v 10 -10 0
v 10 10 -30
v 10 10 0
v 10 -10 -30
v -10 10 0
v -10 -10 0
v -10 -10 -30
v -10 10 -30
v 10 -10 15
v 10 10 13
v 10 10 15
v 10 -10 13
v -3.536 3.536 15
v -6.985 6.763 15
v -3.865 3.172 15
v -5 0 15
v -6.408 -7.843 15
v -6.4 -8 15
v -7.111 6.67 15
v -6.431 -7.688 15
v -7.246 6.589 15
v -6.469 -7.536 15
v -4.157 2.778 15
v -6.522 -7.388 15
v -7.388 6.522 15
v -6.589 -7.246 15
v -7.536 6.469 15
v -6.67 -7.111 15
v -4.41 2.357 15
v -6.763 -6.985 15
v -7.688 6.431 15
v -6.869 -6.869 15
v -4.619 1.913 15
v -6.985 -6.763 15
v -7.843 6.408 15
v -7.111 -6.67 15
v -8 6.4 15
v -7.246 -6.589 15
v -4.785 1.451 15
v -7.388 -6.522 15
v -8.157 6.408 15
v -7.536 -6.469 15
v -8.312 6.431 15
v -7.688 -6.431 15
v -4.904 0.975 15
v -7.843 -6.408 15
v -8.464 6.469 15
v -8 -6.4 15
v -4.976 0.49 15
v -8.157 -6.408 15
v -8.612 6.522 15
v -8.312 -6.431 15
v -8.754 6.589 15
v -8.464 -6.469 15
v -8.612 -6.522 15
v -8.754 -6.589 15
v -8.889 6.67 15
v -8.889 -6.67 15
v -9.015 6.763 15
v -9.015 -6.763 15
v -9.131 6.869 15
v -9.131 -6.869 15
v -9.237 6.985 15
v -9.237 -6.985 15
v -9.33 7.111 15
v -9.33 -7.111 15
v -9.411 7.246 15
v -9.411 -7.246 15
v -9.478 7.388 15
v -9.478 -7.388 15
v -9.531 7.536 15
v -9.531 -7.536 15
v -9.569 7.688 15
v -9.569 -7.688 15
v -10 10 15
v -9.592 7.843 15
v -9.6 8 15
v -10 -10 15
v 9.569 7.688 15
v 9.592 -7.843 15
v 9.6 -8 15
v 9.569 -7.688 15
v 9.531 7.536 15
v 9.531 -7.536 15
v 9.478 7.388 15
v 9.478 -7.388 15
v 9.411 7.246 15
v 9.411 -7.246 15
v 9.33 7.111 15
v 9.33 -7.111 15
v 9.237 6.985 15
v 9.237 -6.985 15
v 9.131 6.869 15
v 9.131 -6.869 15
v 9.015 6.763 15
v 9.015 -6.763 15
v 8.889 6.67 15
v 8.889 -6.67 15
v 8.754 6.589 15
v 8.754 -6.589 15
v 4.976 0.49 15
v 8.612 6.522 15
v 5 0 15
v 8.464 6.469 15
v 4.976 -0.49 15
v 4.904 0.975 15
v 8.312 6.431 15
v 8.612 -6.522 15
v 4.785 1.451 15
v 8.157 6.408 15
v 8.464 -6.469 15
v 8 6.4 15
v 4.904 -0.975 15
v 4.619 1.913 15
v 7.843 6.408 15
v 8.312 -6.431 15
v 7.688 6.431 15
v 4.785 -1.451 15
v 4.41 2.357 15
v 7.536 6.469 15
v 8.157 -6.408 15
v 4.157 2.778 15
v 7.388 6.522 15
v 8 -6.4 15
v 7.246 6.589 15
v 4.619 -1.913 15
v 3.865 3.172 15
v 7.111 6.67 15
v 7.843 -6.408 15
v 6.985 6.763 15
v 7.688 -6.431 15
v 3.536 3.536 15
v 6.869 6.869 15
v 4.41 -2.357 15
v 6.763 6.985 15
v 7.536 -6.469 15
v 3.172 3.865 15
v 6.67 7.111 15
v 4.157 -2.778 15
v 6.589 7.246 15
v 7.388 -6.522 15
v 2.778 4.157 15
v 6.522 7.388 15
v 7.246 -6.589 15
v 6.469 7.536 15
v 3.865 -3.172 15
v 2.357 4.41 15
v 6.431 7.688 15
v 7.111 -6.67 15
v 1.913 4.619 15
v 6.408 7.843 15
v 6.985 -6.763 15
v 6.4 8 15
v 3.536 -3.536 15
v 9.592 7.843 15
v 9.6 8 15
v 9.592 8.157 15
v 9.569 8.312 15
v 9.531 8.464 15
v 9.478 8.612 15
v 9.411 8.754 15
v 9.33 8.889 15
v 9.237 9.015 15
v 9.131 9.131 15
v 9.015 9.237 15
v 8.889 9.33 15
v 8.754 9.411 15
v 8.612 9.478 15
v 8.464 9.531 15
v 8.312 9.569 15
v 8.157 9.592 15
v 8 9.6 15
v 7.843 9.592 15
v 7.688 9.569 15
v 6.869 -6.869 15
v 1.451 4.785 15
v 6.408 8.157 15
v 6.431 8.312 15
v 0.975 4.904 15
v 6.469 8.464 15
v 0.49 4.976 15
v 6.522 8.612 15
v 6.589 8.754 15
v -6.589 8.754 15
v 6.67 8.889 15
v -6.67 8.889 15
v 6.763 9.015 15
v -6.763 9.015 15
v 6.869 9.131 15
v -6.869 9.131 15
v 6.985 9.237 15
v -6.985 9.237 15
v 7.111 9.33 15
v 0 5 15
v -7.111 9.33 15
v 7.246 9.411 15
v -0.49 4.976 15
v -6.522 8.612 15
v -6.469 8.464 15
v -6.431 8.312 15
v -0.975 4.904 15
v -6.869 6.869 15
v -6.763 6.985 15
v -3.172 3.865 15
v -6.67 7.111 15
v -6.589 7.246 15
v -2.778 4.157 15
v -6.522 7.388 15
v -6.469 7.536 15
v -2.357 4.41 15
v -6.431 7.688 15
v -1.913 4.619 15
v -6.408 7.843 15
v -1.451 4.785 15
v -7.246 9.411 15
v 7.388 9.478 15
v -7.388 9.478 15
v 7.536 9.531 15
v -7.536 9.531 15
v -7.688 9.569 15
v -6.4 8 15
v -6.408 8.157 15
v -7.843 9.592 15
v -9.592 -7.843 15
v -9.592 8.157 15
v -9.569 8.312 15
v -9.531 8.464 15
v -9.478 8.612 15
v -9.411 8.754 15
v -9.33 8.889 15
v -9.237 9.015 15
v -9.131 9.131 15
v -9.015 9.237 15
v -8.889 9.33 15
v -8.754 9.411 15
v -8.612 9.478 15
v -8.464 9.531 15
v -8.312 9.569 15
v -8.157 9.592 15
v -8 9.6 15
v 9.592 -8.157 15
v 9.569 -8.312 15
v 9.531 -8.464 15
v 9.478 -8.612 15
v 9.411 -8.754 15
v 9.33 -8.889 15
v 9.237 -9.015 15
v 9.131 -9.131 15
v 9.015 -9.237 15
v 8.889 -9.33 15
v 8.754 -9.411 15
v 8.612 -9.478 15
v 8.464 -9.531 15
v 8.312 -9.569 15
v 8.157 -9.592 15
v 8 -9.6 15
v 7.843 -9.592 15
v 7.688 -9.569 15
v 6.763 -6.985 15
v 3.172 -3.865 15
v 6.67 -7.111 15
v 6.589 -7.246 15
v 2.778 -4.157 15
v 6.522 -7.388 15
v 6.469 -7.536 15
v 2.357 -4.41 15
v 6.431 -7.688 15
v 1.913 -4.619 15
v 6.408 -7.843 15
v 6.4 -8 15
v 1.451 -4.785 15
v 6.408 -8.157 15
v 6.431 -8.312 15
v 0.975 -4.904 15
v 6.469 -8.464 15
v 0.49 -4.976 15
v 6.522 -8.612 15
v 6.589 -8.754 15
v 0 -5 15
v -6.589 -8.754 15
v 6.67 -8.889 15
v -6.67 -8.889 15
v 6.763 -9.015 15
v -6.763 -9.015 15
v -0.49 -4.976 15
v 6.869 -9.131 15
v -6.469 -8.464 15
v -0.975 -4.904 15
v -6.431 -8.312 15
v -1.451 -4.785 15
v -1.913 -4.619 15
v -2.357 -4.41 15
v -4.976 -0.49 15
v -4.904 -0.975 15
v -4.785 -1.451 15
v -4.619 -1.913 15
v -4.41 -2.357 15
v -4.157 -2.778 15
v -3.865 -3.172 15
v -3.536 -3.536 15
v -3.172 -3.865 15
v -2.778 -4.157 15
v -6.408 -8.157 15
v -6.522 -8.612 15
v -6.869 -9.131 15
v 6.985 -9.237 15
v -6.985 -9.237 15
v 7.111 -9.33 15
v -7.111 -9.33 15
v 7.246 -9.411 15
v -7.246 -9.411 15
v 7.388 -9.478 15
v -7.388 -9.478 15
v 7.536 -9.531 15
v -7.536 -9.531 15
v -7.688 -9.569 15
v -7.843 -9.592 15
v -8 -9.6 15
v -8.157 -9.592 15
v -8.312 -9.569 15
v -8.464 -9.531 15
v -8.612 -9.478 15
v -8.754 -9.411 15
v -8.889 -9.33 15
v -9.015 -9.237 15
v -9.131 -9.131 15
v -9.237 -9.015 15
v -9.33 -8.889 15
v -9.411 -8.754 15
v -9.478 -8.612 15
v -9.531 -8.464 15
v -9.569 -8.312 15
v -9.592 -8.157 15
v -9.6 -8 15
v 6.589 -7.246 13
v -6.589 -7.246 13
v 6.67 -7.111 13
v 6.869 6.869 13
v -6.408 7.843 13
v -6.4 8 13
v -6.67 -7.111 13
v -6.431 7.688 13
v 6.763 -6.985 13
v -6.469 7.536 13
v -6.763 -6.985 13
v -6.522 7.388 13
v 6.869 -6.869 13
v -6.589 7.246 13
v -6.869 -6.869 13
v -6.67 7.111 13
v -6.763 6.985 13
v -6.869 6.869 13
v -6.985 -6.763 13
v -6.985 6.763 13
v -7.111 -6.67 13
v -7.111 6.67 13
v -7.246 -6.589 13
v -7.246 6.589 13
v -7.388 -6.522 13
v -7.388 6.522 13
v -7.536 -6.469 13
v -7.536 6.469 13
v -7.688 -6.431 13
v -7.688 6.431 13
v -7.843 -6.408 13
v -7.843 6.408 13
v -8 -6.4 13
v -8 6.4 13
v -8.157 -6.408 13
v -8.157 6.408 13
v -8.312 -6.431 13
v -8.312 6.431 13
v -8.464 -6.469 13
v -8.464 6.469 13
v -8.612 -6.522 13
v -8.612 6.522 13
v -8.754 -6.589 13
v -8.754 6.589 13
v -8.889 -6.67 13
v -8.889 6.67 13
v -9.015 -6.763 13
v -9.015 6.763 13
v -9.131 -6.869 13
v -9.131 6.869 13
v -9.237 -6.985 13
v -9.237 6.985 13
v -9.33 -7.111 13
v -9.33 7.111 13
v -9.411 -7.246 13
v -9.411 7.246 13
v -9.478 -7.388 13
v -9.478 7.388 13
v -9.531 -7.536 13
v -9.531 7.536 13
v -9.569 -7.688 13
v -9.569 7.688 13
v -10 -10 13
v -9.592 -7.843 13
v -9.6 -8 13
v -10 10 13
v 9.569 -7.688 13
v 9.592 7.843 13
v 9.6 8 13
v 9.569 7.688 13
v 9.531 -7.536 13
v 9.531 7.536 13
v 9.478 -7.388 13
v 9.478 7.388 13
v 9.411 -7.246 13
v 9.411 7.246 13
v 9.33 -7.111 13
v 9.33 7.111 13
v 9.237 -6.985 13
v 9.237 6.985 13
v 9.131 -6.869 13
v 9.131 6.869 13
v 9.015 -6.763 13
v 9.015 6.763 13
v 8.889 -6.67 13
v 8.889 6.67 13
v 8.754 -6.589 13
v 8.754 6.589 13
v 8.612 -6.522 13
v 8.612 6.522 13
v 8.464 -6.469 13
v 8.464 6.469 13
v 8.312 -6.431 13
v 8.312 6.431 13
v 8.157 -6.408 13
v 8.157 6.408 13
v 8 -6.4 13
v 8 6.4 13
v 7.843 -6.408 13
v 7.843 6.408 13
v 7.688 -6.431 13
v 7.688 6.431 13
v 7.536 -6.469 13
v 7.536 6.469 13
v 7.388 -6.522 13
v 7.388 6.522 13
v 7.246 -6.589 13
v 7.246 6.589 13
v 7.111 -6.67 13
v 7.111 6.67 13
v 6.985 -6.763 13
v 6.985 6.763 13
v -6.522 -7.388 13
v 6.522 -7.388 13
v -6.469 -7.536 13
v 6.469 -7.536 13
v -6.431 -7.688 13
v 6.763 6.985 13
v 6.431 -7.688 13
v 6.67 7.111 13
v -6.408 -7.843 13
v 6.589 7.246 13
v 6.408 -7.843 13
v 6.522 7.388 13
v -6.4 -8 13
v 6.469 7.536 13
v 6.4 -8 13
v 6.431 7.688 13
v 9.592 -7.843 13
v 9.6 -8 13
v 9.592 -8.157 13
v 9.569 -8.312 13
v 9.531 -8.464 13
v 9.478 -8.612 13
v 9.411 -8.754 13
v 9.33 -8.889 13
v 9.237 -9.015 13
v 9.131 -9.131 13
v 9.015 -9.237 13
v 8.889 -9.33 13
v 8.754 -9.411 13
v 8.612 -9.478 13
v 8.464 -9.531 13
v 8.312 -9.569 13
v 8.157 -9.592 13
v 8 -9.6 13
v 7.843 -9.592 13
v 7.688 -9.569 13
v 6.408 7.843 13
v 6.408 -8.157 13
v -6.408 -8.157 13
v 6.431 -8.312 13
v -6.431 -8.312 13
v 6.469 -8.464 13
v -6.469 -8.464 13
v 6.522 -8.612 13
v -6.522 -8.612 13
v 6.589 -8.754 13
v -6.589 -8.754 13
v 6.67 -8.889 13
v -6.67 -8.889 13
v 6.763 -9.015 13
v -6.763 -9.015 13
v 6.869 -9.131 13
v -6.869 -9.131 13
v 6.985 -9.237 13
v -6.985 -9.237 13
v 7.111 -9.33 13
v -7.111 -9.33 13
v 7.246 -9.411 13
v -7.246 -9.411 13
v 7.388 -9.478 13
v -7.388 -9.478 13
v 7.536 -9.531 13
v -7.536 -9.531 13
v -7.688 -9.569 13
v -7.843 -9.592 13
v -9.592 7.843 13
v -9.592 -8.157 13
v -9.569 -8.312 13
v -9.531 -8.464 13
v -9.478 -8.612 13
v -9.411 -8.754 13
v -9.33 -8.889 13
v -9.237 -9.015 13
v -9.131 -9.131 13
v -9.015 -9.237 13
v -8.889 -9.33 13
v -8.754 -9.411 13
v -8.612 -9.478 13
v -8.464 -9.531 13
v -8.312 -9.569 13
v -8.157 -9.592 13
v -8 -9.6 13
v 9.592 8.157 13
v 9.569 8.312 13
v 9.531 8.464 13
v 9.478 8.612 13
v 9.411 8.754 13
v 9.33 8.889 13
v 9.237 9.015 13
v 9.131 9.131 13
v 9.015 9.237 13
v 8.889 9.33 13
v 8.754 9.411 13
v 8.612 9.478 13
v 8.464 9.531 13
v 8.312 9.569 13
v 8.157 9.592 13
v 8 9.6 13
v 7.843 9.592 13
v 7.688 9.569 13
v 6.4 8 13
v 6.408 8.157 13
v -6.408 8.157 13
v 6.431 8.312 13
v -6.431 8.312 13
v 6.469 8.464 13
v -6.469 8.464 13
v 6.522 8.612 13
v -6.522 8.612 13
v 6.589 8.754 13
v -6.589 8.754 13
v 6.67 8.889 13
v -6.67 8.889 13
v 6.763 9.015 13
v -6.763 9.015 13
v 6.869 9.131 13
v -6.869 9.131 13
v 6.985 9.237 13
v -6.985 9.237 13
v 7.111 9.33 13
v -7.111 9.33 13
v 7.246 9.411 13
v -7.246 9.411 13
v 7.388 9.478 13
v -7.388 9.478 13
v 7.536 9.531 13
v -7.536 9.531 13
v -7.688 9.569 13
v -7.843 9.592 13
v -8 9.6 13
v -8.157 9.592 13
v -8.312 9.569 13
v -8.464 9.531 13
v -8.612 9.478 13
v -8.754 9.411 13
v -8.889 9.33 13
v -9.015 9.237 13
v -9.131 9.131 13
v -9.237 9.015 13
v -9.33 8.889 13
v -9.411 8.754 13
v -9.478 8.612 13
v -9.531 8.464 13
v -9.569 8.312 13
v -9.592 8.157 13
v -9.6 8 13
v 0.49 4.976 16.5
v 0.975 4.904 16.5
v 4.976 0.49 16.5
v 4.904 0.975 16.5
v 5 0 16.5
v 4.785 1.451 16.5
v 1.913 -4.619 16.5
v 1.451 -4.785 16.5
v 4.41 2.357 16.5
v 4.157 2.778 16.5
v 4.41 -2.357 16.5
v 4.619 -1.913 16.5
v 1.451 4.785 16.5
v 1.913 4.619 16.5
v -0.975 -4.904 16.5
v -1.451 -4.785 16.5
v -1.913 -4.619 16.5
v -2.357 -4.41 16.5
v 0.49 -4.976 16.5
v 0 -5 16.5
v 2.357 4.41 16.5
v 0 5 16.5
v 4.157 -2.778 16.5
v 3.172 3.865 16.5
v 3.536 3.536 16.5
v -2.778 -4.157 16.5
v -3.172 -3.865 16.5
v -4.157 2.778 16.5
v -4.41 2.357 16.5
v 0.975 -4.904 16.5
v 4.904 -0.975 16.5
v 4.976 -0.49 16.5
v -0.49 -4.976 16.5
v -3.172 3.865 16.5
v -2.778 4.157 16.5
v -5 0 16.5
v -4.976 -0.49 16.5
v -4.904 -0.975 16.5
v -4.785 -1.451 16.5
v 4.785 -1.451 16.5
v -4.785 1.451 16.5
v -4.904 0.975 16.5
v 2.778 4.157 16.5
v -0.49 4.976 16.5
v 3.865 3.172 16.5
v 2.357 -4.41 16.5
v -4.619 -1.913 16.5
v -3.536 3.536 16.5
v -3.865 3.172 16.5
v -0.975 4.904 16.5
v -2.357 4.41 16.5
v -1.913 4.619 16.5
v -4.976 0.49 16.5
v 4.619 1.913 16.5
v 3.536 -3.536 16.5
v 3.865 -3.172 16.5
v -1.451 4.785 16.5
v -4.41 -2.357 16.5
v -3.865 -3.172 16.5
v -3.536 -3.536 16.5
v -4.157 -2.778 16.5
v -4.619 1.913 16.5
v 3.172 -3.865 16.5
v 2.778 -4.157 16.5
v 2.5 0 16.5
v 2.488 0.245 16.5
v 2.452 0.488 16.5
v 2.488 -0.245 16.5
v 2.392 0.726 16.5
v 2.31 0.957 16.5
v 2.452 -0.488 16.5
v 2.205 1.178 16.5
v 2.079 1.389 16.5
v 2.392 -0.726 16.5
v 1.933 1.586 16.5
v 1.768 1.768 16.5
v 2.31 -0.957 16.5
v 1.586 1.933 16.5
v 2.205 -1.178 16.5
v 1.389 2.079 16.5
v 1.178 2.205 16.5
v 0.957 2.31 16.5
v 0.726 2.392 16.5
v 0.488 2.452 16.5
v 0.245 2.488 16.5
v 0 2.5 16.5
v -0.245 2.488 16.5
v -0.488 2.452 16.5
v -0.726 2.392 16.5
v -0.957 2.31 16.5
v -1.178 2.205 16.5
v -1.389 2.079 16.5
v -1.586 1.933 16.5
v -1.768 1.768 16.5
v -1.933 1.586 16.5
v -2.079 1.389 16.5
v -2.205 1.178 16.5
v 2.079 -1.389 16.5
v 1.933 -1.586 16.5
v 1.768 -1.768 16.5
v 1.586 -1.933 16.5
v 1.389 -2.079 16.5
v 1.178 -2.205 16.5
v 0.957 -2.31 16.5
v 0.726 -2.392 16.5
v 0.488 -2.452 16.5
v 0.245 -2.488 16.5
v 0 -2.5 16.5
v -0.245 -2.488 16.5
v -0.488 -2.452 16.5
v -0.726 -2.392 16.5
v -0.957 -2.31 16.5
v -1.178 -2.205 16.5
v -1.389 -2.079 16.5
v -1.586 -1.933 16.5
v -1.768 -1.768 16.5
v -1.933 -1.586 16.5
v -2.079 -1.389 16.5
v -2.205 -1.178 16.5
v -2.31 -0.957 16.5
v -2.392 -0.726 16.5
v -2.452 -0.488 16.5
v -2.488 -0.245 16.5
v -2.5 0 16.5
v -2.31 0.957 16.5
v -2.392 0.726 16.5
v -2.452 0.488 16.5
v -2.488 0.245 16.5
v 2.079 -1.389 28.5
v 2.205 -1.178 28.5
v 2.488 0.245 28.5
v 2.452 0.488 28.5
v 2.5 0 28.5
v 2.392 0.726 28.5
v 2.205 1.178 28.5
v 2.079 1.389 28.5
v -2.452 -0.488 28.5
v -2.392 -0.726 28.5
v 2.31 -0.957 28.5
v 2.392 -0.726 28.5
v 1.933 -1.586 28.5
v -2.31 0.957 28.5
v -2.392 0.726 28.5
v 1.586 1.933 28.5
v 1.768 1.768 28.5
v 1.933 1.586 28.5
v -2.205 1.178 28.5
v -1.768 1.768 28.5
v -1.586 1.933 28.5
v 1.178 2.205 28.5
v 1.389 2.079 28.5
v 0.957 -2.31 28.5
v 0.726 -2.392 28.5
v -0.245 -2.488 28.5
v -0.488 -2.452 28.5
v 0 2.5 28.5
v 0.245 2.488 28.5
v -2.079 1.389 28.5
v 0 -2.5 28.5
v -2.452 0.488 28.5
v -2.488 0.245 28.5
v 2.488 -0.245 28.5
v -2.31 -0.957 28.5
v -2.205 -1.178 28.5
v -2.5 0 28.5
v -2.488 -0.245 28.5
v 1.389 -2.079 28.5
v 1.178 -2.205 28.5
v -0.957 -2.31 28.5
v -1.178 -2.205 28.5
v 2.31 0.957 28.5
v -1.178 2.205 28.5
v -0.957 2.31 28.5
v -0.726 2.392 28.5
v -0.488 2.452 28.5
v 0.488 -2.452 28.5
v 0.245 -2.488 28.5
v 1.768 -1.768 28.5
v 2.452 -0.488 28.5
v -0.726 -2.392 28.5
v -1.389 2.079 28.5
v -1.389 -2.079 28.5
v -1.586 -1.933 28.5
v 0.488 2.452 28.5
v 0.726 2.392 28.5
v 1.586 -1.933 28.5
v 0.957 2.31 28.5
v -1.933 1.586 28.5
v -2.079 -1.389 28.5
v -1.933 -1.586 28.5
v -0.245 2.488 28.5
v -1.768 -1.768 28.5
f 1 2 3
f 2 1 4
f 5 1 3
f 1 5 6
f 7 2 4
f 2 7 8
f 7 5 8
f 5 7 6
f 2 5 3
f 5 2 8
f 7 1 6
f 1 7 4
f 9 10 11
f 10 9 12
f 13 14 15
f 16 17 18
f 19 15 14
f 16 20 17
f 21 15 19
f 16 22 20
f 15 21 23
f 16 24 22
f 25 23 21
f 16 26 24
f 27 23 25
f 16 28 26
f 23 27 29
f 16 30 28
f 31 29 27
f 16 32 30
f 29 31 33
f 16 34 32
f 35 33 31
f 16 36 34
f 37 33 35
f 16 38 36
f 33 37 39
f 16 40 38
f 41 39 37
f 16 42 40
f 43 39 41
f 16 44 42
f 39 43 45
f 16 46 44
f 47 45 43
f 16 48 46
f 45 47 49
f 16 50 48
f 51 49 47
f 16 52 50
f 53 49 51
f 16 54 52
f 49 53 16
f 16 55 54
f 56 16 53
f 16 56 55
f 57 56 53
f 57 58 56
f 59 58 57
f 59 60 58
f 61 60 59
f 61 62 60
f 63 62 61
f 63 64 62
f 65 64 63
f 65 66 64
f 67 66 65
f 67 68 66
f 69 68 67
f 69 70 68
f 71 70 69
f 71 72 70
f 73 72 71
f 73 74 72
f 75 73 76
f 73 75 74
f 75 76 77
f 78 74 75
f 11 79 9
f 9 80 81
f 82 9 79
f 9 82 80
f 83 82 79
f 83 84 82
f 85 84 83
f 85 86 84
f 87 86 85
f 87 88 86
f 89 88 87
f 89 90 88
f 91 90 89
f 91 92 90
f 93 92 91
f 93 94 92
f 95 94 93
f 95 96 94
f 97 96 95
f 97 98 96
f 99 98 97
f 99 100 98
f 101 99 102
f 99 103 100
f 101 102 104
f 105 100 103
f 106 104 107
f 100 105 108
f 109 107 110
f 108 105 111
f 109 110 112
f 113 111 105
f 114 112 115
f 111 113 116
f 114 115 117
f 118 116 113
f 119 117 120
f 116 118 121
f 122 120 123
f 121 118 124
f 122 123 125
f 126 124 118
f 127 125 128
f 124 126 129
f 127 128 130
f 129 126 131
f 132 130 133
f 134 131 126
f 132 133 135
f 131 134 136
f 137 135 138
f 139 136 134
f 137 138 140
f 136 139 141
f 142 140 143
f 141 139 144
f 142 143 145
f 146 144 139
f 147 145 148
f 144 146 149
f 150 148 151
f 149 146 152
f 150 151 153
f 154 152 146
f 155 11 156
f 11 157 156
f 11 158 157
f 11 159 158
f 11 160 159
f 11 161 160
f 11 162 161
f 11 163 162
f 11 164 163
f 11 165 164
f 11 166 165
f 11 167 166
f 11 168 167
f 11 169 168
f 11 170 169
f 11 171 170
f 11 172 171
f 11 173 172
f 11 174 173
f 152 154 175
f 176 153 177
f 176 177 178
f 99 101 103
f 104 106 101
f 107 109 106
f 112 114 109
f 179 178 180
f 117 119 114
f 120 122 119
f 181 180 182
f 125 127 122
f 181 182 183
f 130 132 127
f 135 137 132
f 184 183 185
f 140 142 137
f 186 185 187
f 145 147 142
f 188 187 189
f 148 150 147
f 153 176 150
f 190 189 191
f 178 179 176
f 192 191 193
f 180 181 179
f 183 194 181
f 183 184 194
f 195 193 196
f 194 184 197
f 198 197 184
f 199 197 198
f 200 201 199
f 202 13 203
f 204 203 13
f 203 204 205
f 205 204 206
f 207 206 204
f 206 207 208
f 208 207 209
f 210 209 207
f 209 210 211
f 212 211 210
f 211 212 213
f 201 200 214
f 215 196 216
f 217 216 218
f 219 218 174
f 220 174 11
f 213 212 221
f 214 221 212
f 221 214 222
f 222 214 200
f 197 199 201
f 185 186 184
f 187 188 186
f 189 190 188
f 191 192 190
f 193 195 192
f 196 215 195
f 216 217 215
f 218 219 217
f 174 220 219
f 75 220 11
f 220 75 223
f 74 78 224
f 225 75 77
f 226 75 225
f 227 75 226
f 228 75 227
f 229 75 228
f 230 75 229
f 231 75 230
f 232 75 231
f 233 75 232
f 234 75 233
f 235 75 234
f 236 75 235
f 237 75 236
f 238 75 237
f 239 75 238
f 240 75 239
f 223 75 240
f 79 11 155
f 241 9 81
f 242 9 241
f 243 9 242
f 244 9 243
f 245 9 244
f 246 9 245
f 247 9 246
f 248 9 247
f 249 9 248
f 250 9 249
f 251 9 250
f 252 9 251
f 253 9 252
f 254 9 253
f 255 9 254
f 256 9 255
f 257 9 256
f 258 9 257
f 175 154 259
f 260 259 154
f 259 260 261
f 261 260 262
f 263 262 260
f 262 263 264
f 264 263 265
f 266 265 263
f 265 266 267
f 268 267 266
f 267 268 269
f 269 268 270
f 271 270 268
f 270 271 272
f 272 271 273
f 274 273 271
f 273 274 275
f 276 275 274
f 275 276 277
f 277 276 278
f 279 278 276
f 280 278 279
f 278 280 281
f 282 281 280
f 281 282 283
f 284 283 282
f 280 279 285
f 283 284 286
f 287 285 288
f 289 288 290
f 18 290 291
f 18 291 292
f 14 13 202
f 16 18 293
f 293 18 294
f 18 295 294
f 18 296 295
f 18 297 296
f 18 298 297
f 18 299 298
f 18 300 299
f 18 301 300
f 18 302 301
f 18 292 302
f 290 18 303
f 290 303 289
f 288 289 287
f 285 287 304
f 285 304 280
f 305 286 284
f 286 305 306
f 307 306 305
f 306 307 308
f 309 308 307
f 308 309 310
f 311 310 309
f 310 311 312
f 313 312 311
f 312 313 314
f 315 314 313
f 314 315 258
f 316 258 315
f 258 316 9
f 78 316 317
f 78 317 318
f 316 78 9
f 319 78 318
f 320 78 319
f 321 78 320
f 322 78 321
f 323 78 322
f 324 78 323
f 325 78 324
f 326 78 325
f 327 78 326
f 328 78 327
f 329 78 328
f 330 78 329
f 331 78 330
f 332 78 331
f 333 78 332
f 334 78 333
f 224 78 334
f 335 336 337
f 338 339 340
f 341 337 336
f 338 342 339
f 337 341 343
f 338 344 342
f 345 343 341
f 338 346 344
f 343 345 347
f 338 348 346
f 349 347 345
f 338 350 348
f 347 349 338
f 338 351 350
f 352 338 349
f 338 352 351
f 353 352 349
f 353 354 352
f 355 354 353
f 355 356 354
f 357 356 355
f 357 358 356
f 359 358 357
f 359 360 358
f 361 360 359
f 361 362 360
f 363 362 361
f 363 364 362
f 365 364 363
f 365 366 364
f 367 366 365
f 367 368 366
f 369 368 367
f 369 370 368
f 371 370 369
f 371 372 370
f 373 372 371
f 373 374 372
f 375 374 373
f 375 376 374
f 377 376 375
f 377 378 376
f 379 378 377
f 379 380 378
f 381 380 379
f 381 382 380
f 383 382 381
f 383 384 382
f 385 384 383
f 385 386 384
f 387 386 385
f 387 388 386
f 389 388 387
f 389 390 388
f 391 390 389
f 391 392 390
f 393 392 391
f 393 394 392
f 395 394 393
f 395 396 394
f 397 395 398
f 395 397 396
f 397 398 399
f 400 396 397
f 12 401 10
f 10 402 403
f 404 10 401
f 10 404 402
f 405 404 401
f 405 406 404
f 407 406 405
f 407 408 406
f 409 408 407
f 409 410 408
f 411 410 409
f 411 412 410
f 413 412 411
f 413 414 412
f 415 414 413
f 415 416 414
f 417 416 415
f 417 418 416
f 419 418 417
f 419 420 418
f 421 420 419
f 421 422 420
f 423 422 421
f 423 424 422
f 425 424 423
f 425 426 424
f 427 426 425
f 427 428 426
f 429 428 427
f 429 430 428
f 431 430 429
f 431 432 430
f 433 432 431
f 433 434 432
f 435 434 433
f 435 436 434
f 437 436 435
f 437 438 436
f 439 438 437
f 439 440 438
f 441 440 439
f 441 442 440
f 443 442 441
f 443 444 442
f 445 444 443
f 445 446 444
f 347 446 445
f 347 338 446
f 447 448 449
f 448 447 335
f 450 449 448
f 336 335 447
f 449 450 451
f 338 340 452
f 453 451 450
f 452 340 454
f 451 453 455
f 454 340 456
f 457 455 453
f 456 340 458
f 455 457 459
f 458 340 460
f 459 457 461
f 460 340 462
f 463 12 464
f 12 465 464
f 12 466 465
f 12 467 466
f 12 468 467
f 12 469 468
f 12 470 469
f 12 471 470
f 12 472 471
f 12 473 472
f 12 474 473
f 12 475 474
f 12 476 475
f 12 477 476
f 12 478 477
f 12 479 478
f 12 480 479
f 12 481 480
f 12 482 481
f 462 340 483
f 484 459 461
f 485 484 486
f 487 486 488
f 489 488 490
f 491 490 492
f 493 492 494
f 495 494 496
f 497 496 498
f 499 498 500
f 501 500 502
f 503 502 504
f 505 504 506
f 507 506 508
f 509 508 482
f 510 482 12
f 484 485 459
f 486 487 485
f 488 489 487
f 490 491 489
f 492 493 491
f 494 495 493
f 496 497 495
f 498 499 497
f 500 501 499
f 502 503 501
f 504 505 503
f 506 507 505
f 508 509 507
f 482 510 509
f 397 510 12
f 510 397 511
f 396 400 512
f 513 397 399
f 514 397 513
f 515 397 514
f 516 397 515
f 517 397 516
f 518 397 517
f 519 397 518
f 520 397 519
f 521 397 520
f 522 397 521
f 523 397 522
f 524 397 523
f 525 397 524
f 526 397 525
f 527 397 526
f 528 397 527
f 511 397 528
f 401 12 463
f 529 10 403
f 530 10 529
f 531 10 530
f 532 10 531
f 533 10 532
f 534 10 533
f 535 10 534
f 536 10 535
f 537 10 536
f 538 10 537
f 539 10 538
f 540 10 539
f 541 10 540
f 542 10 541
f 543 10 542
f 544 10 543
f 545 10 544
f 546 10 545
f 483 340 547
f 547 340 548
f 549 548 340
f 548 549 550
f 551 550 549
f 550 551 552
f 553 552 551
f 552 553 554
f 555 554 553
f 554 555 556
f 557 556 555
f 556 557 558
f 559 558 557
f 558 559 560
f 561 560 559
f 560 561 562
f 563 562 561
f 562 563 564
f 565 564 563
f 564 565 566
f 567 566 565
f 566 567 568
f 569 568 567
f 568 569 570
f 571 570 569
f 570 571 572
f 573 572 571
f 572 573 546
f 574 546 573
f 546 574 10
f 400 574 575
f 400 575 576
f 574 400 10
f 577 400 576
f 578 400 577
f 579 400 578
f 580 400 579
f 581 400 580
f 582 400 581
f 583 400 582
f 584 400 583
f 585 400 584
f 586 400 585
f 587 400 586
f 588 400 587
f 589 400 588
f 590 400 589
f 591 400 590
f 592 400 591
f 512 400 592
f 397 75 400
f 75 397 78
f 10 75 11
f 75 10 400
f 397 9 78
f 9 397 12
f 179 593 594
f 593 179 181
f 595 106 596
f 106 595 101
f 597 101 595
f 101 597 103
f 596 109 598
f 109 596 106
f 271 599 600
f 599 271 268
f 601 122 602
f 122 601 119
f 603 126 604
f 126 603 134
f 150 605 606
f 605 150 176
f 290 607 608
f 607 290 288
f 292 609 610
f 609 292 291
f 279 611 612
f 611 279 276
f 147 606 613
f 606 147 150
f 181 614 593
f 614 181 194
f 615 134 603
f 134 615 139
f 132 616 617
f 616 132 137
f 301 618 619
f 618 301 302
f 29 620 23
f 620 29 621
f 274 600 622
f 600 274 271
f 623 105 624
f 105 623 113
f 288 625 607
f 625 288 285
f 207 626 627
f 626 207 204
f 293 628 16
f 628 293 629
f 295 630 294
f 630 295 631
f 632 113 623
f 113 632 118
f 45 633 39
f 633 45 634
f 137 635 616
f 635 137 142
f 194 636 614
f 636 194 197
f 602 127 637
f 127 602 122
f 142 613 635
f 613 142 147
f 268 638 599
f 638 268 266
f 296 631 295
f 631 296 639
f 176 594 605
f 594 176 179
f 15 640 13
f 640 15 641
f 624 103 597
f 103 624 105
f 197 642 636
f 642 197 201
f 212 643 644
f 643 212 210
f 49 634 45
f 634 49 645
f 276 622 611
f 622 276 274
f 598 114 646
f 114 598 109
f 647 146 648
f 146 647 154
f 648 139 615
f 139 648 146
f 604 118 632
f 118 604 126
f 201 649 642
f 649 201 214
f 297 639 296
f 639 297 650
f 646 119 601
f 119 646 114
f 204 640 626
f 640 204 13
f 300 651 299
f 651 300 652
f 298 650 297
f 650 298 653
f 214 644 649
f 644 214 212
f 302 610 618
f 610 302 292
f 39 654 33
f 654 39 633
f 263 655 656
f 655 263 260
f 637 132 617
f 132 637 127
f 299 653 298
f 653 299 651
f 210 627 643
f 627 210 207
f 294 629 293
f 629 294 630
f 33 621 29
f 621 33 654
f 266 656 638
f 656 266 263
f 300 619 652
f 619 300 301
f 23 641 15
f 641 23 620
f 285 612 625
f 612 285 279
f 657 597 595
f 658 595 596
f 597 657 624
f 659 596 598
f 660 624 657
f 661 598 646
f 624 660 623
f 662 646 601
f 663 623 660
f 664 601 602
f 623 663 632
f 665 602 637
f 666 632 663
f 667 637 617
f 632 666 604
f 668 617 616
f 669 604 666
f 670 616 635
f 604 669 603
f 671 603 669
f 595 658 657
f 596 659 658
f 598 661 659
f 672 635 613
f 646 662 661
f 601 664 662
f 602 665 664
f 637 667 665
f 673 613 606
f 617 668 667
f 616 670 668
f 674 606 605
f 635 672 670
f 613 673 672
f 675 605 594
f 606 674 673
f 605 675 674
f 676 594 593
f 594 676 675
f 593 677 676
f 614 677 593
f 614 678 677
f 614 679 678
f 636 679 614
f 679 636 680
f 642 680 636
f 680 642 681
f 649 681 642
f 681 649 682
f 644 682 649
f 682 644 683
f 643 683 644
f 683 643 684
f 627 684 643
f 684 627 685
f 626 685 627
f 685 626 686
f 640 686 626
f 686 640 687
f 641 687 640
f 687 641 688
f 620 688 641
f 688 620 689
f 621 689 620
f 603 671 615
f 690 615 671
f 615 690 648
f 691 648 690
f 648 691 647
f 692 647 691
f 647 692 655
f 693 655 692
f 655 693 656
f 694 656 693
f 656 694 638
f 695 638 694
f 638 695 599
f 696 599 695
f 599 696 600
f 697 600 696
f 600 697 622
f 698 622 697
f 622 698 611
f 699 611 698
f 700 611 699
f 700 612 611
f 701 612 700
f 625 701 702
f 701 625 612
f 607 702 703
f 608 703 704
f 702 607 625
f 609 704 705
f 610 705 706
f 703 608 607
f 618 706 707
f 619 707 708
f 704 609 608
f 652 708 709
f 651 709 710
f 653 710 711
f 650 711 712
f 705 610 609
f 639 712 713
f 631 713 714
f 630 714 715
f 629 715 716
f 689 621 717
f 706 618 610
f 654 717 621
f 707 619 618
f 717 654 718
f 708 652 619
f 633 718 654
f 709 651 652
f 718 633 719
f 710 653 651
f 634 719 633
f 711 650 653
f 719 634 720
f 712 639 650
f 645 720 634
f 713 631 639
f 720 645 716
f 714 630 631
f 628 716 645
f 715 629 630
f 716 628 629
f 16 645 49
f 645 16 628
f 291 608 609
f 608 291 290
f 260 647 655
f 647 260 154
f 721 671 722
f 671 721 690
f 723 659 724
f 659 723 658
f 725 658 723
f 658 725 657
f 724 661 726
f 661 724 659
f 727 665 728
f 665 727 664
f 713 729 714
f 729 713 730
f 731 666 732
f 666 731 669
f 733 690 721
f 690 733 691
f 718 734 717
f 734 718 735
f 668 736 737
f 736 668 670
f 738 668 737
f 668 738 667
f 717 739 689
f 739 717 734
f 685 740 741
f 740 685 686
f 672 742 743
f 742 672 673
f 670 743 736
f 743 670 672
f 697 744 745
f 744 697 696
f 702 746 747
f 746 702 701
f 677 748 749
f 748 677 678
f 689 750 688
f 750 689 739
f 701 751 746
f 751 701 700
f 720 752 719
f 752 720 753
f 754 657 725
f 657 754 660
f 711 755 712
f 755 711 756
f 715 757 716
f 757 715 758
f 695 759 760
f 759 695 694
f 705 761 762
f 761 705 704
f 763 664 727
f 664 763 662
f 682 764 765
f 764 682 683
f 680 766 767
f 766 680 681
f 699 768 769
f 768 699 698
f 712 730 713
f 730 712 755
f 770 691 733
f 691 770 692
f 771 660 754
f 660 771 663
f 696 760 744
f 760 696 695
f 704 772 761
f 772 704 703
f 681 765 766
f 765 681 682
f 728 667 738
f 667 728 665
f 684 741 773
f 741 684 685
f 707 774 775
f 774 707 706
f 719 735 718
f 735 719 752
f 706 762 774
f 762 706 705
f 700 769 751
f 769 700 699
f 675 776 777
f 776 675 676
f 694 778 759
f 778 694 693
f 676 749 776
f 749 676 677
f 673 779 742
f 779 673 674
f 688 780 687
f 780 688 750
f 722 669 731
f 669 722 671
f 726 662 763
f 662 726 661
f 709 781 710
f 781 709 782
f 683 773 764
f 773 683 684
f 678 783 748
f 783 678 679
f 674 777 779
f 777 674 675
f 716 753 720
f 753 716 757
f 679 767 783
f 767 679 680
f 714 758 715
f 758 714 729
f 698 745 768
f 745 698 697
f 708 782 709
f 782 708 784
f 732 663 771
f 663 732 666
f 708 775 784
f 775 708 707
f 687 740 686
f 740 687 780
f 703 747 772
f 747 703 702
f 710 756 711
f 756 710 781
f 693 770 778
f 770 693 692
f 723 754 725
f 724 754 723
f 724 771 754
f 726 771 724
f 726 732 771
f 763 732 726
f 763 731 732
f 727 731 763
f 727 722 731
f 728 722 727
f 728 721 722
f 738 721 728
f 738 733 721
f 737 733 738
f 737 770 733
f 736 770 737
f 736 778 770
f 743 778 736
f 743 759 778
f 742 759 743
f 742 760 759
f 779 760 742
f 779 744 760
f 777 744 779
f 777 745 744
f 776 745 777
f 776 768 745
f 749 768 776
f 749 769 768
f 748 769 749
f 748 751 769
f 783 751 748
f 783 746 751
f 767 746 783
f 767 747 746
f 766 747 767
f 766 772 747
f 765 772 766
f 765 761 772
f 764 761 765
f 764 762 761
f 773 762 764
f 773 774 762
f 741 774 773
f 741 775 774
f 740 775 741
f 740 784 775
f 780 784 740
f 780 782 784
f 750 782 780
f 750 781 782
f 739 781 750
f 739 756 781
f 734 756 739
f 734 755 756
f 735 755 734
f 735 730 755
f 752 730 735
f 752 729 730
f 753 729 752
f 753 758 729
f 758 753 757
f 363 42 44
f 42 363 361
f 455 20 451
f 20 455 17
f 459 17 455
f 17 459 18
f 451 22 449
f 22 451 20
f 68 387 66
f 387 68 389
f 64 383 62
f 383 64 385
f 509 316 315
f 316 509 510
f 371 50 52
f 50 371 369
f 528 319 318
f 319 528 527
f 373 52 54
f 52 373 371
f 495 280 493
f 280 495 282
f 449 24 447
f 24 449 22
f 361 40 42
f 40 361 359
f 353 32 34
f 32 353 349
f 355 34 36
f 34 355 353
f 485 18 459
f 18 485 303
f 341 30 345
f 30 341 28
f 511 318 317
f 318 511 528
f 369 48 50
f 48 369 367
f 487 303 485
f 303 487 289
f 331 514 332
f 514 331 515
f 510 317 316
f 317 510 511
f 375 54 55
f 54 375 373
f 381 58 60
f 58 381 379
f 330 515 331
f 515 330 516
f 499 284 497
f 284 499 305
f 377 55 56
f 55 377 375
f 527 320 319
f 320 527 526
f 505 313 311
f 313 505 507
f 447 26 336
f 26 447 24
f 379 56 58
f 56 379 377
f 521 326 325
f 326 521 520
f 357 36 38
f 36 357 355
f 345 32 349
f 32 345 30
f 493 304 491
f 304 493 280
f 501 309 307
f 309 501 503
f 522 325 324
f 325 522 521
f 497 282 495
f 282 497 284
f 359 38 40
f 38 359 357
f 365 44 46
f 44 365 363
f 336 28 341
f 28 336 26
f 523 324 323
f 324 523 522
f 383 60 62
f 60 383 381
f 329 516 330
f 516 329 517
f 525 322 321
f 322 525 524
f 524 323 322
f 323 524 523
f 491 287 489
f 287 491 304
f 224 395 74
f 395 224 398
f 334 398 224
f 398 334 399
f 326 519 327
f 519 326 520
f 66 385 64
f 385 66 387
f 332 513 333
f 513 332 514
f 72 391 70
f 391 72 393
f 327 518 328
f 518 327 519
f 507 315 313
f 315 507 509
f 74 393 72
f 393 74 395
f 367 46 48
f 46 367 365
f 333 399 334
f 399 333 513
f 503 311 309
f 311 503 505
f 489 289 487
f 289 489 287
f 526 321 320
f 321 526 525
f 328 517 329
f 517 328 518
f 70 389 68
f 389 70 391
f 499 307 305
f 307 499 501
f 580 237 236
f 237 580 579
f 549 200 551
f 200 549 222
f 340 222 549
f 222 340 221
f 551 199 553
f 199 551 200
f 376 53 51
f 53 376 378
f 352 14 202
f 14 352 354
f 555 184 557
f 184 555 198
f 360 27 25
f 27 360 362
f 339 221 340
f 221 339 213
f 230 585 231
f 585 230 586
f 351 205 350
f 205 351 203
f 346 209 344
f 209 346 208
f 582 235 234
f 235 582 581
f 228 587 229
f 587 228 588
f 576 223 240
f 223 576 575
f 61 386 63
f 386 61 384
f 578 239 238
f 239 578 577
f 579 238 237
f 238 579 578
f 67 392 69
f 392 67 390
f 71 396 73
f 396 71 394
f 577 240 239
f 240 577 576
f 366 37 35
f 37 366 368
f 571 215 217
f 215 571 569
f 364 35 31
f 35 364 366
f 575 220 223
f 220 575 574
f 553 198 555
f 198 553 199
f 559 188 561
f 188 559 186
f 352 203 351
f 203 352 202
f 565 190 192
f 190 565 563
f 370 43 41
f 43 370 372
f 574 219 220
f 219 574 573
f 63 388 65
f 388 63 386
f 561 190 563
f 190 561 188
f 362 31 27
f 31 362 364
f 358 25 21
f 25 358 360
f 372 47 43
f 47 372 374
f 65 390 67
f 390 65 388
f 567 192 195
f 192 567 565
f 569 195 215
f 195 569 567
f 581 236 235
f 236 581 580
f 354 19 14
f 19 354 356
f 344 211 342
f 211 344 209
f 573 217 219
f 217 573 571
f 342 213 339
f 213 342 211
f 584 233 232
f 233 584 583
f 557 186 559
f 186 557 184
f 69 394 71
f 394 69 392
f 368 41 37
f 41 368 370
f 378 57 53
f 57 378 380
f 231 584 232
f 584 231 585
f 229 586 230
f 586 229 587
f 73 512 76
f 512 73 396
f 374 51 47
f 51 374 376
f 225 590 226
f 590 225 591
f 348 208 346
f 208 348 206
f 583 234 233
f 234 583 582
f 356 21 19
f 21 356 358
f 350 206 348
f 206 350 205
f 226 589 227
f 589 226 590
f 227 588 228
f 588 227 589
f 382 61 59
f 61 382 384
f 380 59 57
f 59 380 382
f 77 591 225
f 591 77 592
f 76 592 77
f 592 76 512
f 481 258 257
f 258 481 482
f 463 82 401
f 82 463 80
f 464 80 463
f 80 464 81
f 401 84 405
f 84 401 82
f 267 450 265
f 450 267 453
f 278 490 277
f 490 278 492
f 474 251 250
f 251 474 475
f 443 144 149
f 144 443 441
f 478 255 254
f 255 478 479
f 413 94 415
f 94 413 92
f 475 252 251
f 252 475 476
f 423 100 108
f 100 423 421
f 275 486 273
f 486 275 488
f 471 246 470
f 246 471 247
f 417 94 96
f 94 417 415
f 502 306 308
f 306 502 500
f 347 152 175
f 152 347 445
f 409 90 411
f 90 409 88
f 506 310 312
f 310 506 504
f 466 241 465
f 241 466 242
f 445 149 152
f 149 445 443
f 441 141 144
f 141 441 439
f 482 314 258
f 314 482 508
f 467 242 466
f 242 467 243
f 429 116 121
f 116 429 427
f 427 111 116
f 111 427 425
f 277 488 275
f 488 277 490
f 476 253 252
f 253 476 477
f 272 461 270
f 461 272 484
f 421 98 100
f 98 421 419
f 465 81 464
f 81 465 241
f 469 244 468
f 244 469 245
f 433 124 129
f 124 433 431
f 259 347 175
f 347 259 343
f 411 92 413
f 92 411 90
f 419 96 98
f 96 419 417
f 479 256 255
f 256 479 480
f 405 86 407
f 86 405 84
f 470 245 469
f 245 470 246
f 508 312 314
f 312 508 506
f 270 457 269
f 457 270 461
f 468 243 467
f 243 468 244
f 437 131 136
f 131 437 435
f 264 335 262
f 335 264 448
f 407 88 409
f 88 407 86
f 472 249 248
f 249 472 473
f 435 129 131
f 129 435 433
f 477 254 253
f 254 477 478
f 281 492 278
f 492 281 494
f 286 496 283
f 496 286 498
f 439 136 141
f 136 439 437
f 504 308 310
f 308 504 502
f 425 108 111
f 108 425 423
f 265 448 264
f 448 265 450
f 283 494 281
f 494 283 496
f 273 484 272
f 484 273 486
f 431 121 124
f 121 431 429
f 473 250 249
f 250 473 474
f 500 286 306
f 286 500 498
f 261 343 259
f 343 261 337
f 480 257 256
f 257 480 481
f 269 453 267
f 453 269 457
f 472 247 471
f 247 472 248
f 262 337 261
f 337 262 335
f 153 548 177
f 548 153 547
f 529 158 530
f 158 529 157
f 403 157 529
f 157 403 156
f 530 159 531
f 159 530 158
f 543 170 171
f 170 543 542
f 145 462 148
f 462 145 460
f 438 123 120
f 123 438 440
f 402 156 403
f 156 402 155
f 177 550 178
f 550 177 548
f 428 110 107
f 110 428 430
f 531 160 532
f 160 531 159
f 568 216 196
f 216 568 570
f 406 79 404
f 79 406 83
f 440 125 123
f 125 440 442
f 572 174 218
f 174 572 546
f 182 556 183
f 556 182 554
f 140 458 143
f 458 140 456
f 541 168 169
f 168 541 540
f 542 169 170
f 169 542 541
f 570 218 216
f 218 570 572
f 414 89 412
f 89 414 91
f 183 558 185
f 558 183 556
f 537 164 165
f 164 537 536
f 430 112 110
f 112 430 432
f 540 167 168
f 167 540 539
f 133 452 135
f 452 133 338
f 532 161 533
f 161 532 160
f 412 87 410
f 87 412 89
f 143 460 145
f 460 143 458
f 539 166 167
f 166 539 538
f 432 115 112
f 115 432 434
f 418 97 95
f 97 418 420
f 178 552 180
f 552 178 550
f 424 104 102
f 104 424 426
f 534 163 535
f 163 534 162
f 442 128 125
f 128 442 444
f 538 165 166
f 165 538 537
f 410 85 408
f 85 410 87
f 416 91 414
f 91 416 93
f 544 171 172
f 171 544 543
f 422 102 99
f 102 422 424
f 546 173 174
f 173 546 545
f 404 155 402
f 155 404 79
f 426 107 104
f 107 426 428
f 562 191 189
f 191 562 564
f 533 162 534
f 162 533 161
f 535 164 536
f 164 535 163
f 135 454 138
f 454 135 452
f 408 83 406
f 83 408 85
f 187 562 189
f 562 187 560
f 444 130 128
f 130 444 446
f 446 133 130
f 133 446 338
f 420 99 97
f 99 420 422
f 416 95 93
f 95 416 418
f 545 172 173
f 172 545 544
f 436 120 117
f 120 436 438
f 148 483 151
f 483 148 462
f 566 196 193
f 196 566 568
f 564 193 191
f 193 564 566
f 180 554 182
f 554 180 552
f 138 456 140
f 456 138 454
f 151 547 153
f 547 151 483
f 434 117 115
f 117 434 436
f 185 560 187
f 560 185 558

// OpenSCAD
$fn=64;

face_w = 20.0;
body_l = 30.0;
shaft_d = 5.0;
shaft_l = 12.0;

mount_spacing = 16.0;
mount_hole_d = 3.2;

front_plate_t = 2.0;
body_w = face_w;
body_h = face_w;

boss_d = 10.0;
boss_h = 1.5;

module motor_body() {
    translate([0,0,-body_l/2])
        cube([body_w, body_h, body_l], center=true);
}

module front_plate() {
    translate([0,0, body_l/2 - front_plate_t/2])
        cube([face_w, face_w, front_plate_t], center=true);
}

module mounting_holes() {
    for (x = [-mount_spacing/2, mount_spacing/2])
        for (y = [-mount_spacing/2, mount_spacing/2])
            translate([x,y, body_l/2 - front_plate_t/2])
                cylinder(d=mount_hole_d, h=front_plate_t + 0.6, center=true);
}

module boss() {
    translate([0,0, body_l/2 + boss_h/2])
        cylinder(d=boss_d, h=boss_h, center=true);
}

module shaft() {
    translate([0,0, body_l/2 + boss_h + shaft_l/2])
        cylinder(d=shaft_d, h=shaft_l, center=true);
}

difference() {
    union() {
        motor_body();
        front_plate();
        boss();
        shaft();
    }
    mounting_holes();
}
